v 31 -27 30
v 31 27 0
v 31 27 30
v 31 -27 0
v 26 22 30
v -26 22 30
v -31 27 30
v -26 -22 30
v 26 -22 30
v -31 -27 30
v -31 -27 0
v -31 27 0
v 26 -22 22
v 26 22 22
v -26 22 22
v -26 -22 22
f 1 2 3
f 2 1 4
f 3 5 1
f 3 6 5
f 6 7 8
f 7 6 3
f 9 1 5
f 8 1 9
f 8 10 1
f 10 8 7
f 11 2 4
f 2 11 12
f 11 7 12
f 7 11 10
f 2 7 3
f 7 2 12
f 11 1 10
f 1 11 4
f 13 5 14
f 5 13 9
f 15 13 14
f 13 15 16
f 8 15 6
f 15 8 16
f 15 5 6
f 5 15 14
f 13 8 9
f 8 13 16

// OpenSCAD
// millimeters
leg_width = 52; // front
leg_depth = 44;
distance_to_floor = 22;
// MEASURE AGAIN

piece_heigh = 30;

padding = 5;

// TODO: measure again;

translate([0,0,piece_heigh/2]) {  
  difference(){
    cube([leg_width+padding*2, leg_depth+padding*2, piece_heigh], center=true);
    
    translate([0,0,distance_to_floor])
      cube([leg_width, leg_depth, piece_heigh], center=true);
  }
}
